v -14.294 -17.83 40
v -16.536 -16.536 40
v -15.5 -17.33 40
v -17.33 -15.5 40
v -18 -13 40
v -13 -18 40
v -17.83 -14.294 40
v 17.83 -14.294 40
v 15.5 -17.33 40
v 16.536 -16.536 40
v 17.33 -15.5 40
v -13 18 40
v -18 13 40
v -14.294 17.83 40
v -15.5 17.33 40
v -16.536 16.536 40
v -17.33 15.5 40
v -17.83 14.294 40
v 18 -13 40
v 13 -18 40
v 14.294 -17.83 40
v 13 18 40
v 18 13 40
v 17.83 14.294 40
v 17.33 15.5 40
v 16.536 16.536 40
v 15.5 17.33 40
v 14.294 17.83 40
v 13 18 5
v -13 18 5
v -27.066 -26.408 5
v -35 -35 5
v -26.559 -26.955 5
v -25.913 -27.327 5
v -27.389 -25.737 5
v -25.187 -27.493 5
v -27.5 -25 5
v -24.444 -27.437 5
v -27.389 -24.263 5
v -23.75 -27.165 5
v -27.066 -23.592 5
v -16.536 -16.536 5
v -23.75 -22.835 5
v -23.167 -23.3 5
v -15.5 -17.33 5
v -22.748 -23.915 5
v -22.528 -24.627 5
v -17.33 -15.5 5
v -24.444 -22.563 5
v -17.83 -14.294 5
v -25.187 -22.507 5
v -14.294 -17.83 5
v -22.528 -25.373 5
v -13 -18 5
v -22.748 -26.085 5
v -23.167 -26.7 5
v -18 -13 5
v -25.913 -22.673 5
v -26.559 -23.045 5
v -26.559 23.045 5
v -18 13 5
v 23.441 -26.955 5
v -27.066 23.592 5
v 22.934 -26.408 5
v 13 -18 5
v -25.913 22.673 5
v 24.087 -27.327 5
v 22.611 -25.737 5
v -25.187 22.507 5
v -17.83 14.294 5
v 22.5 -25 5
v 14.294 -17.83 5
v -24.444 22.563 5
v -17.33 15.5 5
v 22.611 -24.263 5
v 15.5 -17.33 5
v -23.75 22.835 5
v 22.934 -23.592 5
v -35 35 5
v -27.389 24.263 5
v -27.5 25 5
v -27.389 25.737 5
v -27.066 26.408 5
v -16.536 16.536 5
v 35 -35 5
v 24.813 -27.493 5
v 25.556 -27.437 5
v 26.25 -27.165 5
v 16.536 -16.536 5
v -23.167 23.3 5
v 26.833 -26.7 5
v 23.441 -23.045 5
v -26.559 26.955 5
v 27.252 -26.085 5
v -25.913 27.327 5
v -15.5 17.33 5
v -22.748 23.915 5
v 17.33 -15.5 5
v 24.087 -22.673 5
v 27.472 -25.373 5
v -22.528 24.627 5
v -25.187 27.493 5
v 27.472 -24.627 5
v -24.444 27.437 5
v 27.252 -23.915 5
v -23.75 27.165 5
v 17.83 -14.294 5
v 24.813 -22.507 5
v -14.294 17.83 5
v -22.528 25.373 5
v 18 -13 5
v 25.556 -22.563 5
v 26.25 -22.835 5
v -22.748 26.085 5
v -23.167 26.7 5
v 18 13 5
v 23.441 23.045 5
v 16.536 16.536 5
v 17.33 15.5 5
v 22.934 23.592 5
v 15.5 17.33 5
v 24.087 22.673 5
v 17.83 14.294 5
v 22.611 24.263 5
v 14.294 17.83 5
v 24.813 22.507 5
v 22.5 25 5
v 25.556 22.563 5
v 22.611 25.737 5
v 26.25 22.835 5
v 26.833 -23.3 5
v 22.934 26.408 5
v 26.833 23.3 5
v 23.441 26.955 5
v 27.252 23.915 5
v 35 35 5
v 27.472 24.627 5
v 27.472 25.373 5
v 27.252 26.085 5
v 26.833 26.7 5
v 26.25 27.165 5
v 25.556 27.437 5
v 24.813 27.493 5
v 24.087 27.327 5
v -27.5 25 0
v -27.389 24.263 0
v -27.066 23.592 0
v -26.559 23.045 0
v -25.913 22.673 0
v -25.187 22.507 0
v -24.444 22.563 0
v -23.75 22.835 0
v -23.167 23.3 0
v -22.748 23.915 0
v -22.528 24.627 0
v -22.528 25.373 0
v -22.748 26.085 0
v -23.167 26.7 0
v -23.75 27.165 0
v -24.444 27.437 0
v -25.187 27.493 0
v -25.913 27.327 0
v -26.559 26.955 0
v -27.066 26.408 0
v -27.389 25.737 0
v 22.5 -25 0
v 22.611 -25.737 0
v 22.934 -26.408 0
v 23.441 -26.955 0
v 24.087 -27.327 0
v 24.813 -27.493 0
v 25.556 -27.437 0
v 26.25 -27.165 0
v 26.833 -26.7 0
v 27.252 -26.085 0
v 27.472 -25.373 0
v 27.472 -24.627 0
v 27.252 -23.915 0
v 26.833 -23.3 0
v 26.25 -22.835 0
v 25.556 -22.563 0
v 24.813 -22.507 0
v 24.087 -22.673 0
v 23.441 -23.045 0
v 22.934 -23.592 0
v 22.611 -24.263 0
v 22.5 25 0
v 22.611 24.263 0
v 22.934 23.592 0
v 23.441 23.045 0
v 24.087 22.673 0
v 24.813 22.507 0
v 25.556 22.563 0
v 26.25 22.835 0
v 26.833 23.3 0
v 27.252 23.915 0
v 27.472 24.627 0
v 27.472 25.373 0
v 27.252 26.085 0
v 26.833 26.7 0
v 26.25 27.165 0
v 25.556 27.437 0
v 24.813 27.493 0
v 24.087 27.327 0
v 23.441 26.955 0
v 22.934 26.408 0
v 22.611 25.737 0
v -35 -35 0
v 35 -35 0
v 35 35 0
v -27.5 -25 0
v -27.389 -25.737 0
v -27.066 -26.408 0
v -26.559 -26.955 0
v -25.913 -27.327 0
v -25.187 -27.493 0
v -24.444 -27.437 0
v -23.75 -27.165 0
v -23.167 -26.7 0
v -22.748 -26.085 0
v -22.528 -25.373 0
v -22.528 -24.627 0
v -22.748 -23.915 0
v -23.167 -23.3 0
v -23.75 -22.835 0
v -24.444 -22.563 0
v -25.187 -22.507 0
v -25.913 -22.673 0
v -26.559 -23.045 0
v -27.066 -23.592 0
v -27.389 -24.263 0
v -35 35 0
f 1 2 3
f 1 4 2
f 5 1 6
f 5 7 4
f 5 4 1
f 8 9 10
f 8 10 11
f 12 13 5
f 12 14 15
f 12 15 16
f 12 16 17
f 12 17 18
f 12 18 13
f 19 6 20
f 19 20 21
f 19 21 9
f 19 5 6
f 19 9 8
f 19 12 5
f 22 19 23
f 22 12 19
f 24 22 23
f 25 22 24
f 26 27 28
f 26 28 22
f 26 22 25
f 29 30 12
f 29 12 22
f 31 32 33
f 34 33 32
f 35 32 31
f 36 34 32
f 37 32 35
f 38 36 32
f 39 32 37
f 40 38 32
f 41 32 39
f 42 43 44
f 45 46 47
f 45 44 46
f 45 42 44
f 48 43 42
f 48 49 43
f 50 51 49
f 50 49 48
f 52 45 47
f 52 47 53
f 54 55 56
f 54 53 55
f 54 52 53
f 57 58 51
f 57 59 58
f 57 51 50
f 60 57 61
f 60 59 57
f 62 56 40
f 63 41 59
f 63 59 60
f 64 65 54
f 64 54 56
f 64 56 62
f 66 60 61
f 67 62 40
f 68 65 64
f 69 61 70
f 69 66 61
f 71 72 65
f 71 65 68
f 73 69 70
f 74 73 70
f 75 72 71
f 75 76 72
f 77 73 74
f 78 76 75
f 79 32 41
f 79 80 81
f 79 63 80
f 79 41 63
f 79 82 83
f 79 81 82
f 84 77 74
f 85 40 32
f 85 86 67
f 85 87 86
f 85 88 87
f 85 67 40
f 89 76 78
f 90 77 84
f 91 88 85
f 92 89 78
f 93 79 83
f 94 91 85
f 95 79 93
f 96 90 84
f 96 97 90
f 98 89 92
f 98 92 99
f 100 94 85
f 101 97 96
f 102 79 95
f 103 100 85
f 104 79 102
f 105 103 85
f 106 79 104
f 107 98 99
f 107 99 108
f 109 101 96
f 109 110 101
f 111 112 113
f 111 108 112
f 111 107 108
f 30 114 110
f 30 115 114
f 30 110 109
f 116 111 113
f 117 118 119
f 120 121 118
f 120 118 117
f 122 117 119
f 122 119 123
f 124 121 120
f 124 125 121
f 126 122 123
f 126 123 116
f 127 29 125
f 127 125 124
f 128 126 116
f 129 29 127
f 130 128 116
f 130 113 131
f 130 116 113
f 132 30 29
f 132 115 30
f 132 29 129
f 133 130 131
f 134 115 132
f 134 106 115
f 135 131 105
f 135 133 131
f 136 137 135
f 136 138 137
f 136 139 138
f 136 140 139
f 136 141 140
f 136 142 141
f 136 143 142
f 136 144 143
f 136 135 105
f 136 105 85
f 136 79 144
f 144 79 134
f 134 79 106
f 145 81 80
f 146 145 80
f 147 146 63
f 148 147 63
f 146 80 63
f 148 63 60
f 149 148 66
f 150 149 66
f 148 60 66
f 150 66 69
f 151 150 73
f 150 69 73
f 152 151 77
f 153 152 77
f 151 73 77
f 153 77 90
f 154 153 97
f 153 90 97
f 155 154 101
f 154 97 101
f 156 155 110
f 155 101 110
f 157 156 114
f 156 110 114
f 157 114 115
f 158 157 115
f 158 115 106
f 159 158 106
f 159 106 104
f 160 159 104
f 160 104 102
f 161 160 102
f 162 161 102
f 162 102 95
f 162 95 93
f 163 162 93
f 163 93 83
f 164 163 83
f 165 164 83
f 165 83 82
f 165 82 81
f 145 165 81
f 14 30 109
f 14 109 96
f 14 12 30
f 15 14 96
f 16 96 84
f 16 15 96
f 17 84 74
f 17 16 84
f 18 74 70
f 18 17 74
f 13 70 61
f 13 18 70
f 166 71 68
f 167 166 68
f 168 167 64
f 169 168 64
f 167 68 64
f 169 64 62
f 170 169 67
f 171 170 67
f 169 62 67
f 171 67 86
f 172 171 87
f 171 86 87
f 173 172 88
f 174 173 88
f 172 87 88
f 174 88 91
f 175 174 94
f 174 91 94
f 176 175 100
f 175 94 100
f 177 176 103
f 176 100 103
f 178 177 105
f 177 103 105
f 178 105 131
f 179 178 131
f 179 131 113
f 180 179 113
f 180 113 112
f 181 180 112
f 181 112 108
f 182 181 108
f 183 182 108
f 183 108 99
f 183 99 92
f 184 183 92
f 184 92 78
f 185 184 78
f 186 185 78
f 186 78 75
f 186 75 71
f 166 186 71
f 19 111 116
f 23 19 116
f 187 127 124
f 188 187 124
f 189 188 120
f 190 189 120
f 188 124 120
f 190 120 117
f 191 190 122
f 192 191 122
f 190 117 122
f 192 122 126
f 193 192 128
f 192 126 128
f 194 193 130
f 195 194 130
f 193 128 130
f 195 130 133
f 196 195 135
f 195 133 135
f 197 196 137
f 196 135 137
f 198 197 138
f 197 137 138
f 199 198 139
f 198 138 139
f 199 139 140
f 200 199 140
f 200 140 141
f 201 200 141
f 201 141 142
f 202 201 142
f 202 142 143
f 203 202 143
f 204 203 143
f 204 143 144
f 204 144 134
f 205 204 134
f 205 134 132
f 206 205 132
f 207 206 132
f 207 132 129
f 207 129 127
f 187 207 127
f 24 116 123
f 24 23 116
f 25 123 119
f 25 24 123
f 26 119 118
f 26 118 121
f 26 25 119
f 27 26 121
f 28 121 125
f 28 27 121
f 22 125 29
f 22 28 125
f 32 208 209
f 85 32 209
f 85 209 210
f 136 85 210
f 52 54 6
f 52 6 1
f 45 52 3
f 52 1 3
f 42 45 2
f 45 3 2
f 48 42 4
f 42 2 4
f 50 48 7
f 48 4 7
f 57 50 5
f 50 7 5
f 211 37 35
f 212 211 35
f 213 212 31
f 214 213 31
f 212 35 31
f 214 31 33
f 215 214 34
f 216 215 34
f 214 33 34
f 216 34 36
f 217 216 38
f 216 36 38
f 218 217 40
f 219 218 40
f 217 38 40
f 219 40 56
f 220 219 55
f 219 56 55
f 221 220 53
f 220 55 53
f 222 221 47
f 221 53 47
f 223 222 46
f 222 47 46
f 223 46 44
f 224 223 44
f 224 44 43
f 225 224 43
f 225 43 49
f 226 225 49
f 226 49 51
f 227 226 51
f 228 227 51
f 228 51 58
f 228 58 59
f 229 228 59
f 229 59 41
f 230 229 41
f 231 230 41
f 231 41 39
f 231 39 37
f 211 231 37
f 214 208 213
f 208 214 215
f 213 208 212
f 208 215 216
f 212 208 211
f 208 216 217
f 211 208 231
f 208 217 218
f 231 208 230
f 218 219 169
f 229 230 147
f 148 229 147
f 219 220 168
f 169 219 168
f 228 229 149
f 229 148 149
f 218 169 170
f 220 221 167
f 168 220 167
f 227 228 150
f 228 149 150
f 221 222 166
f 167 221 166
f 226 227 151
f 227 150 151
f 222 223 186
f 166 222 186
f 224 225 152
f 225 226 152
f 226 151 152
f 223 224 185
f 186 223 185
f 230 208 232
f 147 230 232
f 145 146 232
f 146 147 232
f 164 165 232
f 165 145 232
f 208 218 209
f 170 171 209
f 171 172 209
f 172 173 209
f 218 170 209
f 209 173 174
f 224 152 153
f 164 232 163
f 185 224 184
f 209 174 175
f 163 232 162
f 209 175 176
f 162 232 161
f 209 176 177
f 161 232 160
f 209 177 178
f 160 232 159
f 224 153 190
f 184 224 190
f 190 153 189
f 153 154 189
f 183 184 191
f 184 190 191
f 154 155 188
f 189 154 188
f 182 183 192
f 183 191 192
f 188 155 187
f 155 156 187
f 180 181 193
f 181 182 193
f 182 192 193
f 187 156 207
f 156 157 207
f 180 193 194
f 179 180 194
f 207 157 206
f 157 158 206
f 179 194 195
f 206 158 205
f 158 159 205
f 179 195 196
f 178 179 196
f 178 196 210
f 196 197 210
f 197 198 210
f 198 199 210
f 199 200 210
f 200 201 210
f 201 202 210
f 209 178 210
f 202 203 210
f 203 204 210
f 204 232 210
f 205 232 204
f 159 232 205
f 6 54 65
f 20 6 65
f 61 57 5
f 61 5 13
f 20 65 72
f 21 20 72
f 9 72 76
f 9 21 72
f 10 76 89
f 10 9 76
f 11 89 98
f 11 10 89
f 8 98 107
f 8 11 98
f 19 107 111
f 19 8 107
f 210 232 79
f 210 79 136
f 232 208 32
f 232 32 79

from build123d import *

# Parameters (mm, degrees)
F0_W     = 70
F0_H     = 70
F1_DEPTH = 5
F2_D     = 5
F3_W     = 36
F3_H     = 36
F4_DEPTH = 35
F5_R     = 5


# Not quite as in the source:
# - a feature names something its author has since deleted; it is built from what else it names


with BuildPart() as f1:
    # F0 (on Top) → F1 (new body)
    with BuildSketch(Plane.XY):
        Rectangle(F0_W, F0_H)
    extrude(amount=F1_DEPTH)

    # F2 (through all)
    with Locations(Plane(origin=(0, 0, 0), x_dir=(1, 0, 0), z_dir=(0, 0, -1))):
        with Locations((-25, -25), (25, -25), (25, 25), (-25, 25)):
            Hole(F2_D / 2)

    # F3 (on face) → F4 (join)
    with BuildSketch(Plane.XY.offset(5)):
        Rectangle(F3_W, F3_H)
    extrude(amount=F4_DEPTH)

    # F5
    f5_edges = [f1.edges().sort_by_distance(p)[0] for p in [
        (-18, 18, 22.5),
        (-18, -18, 22.5),
        (18, -18, 22.5),
        (18, 18, 22.5),
    ]]
    fillet(f5_edges, radius=F5_R)


solid = f1.part
